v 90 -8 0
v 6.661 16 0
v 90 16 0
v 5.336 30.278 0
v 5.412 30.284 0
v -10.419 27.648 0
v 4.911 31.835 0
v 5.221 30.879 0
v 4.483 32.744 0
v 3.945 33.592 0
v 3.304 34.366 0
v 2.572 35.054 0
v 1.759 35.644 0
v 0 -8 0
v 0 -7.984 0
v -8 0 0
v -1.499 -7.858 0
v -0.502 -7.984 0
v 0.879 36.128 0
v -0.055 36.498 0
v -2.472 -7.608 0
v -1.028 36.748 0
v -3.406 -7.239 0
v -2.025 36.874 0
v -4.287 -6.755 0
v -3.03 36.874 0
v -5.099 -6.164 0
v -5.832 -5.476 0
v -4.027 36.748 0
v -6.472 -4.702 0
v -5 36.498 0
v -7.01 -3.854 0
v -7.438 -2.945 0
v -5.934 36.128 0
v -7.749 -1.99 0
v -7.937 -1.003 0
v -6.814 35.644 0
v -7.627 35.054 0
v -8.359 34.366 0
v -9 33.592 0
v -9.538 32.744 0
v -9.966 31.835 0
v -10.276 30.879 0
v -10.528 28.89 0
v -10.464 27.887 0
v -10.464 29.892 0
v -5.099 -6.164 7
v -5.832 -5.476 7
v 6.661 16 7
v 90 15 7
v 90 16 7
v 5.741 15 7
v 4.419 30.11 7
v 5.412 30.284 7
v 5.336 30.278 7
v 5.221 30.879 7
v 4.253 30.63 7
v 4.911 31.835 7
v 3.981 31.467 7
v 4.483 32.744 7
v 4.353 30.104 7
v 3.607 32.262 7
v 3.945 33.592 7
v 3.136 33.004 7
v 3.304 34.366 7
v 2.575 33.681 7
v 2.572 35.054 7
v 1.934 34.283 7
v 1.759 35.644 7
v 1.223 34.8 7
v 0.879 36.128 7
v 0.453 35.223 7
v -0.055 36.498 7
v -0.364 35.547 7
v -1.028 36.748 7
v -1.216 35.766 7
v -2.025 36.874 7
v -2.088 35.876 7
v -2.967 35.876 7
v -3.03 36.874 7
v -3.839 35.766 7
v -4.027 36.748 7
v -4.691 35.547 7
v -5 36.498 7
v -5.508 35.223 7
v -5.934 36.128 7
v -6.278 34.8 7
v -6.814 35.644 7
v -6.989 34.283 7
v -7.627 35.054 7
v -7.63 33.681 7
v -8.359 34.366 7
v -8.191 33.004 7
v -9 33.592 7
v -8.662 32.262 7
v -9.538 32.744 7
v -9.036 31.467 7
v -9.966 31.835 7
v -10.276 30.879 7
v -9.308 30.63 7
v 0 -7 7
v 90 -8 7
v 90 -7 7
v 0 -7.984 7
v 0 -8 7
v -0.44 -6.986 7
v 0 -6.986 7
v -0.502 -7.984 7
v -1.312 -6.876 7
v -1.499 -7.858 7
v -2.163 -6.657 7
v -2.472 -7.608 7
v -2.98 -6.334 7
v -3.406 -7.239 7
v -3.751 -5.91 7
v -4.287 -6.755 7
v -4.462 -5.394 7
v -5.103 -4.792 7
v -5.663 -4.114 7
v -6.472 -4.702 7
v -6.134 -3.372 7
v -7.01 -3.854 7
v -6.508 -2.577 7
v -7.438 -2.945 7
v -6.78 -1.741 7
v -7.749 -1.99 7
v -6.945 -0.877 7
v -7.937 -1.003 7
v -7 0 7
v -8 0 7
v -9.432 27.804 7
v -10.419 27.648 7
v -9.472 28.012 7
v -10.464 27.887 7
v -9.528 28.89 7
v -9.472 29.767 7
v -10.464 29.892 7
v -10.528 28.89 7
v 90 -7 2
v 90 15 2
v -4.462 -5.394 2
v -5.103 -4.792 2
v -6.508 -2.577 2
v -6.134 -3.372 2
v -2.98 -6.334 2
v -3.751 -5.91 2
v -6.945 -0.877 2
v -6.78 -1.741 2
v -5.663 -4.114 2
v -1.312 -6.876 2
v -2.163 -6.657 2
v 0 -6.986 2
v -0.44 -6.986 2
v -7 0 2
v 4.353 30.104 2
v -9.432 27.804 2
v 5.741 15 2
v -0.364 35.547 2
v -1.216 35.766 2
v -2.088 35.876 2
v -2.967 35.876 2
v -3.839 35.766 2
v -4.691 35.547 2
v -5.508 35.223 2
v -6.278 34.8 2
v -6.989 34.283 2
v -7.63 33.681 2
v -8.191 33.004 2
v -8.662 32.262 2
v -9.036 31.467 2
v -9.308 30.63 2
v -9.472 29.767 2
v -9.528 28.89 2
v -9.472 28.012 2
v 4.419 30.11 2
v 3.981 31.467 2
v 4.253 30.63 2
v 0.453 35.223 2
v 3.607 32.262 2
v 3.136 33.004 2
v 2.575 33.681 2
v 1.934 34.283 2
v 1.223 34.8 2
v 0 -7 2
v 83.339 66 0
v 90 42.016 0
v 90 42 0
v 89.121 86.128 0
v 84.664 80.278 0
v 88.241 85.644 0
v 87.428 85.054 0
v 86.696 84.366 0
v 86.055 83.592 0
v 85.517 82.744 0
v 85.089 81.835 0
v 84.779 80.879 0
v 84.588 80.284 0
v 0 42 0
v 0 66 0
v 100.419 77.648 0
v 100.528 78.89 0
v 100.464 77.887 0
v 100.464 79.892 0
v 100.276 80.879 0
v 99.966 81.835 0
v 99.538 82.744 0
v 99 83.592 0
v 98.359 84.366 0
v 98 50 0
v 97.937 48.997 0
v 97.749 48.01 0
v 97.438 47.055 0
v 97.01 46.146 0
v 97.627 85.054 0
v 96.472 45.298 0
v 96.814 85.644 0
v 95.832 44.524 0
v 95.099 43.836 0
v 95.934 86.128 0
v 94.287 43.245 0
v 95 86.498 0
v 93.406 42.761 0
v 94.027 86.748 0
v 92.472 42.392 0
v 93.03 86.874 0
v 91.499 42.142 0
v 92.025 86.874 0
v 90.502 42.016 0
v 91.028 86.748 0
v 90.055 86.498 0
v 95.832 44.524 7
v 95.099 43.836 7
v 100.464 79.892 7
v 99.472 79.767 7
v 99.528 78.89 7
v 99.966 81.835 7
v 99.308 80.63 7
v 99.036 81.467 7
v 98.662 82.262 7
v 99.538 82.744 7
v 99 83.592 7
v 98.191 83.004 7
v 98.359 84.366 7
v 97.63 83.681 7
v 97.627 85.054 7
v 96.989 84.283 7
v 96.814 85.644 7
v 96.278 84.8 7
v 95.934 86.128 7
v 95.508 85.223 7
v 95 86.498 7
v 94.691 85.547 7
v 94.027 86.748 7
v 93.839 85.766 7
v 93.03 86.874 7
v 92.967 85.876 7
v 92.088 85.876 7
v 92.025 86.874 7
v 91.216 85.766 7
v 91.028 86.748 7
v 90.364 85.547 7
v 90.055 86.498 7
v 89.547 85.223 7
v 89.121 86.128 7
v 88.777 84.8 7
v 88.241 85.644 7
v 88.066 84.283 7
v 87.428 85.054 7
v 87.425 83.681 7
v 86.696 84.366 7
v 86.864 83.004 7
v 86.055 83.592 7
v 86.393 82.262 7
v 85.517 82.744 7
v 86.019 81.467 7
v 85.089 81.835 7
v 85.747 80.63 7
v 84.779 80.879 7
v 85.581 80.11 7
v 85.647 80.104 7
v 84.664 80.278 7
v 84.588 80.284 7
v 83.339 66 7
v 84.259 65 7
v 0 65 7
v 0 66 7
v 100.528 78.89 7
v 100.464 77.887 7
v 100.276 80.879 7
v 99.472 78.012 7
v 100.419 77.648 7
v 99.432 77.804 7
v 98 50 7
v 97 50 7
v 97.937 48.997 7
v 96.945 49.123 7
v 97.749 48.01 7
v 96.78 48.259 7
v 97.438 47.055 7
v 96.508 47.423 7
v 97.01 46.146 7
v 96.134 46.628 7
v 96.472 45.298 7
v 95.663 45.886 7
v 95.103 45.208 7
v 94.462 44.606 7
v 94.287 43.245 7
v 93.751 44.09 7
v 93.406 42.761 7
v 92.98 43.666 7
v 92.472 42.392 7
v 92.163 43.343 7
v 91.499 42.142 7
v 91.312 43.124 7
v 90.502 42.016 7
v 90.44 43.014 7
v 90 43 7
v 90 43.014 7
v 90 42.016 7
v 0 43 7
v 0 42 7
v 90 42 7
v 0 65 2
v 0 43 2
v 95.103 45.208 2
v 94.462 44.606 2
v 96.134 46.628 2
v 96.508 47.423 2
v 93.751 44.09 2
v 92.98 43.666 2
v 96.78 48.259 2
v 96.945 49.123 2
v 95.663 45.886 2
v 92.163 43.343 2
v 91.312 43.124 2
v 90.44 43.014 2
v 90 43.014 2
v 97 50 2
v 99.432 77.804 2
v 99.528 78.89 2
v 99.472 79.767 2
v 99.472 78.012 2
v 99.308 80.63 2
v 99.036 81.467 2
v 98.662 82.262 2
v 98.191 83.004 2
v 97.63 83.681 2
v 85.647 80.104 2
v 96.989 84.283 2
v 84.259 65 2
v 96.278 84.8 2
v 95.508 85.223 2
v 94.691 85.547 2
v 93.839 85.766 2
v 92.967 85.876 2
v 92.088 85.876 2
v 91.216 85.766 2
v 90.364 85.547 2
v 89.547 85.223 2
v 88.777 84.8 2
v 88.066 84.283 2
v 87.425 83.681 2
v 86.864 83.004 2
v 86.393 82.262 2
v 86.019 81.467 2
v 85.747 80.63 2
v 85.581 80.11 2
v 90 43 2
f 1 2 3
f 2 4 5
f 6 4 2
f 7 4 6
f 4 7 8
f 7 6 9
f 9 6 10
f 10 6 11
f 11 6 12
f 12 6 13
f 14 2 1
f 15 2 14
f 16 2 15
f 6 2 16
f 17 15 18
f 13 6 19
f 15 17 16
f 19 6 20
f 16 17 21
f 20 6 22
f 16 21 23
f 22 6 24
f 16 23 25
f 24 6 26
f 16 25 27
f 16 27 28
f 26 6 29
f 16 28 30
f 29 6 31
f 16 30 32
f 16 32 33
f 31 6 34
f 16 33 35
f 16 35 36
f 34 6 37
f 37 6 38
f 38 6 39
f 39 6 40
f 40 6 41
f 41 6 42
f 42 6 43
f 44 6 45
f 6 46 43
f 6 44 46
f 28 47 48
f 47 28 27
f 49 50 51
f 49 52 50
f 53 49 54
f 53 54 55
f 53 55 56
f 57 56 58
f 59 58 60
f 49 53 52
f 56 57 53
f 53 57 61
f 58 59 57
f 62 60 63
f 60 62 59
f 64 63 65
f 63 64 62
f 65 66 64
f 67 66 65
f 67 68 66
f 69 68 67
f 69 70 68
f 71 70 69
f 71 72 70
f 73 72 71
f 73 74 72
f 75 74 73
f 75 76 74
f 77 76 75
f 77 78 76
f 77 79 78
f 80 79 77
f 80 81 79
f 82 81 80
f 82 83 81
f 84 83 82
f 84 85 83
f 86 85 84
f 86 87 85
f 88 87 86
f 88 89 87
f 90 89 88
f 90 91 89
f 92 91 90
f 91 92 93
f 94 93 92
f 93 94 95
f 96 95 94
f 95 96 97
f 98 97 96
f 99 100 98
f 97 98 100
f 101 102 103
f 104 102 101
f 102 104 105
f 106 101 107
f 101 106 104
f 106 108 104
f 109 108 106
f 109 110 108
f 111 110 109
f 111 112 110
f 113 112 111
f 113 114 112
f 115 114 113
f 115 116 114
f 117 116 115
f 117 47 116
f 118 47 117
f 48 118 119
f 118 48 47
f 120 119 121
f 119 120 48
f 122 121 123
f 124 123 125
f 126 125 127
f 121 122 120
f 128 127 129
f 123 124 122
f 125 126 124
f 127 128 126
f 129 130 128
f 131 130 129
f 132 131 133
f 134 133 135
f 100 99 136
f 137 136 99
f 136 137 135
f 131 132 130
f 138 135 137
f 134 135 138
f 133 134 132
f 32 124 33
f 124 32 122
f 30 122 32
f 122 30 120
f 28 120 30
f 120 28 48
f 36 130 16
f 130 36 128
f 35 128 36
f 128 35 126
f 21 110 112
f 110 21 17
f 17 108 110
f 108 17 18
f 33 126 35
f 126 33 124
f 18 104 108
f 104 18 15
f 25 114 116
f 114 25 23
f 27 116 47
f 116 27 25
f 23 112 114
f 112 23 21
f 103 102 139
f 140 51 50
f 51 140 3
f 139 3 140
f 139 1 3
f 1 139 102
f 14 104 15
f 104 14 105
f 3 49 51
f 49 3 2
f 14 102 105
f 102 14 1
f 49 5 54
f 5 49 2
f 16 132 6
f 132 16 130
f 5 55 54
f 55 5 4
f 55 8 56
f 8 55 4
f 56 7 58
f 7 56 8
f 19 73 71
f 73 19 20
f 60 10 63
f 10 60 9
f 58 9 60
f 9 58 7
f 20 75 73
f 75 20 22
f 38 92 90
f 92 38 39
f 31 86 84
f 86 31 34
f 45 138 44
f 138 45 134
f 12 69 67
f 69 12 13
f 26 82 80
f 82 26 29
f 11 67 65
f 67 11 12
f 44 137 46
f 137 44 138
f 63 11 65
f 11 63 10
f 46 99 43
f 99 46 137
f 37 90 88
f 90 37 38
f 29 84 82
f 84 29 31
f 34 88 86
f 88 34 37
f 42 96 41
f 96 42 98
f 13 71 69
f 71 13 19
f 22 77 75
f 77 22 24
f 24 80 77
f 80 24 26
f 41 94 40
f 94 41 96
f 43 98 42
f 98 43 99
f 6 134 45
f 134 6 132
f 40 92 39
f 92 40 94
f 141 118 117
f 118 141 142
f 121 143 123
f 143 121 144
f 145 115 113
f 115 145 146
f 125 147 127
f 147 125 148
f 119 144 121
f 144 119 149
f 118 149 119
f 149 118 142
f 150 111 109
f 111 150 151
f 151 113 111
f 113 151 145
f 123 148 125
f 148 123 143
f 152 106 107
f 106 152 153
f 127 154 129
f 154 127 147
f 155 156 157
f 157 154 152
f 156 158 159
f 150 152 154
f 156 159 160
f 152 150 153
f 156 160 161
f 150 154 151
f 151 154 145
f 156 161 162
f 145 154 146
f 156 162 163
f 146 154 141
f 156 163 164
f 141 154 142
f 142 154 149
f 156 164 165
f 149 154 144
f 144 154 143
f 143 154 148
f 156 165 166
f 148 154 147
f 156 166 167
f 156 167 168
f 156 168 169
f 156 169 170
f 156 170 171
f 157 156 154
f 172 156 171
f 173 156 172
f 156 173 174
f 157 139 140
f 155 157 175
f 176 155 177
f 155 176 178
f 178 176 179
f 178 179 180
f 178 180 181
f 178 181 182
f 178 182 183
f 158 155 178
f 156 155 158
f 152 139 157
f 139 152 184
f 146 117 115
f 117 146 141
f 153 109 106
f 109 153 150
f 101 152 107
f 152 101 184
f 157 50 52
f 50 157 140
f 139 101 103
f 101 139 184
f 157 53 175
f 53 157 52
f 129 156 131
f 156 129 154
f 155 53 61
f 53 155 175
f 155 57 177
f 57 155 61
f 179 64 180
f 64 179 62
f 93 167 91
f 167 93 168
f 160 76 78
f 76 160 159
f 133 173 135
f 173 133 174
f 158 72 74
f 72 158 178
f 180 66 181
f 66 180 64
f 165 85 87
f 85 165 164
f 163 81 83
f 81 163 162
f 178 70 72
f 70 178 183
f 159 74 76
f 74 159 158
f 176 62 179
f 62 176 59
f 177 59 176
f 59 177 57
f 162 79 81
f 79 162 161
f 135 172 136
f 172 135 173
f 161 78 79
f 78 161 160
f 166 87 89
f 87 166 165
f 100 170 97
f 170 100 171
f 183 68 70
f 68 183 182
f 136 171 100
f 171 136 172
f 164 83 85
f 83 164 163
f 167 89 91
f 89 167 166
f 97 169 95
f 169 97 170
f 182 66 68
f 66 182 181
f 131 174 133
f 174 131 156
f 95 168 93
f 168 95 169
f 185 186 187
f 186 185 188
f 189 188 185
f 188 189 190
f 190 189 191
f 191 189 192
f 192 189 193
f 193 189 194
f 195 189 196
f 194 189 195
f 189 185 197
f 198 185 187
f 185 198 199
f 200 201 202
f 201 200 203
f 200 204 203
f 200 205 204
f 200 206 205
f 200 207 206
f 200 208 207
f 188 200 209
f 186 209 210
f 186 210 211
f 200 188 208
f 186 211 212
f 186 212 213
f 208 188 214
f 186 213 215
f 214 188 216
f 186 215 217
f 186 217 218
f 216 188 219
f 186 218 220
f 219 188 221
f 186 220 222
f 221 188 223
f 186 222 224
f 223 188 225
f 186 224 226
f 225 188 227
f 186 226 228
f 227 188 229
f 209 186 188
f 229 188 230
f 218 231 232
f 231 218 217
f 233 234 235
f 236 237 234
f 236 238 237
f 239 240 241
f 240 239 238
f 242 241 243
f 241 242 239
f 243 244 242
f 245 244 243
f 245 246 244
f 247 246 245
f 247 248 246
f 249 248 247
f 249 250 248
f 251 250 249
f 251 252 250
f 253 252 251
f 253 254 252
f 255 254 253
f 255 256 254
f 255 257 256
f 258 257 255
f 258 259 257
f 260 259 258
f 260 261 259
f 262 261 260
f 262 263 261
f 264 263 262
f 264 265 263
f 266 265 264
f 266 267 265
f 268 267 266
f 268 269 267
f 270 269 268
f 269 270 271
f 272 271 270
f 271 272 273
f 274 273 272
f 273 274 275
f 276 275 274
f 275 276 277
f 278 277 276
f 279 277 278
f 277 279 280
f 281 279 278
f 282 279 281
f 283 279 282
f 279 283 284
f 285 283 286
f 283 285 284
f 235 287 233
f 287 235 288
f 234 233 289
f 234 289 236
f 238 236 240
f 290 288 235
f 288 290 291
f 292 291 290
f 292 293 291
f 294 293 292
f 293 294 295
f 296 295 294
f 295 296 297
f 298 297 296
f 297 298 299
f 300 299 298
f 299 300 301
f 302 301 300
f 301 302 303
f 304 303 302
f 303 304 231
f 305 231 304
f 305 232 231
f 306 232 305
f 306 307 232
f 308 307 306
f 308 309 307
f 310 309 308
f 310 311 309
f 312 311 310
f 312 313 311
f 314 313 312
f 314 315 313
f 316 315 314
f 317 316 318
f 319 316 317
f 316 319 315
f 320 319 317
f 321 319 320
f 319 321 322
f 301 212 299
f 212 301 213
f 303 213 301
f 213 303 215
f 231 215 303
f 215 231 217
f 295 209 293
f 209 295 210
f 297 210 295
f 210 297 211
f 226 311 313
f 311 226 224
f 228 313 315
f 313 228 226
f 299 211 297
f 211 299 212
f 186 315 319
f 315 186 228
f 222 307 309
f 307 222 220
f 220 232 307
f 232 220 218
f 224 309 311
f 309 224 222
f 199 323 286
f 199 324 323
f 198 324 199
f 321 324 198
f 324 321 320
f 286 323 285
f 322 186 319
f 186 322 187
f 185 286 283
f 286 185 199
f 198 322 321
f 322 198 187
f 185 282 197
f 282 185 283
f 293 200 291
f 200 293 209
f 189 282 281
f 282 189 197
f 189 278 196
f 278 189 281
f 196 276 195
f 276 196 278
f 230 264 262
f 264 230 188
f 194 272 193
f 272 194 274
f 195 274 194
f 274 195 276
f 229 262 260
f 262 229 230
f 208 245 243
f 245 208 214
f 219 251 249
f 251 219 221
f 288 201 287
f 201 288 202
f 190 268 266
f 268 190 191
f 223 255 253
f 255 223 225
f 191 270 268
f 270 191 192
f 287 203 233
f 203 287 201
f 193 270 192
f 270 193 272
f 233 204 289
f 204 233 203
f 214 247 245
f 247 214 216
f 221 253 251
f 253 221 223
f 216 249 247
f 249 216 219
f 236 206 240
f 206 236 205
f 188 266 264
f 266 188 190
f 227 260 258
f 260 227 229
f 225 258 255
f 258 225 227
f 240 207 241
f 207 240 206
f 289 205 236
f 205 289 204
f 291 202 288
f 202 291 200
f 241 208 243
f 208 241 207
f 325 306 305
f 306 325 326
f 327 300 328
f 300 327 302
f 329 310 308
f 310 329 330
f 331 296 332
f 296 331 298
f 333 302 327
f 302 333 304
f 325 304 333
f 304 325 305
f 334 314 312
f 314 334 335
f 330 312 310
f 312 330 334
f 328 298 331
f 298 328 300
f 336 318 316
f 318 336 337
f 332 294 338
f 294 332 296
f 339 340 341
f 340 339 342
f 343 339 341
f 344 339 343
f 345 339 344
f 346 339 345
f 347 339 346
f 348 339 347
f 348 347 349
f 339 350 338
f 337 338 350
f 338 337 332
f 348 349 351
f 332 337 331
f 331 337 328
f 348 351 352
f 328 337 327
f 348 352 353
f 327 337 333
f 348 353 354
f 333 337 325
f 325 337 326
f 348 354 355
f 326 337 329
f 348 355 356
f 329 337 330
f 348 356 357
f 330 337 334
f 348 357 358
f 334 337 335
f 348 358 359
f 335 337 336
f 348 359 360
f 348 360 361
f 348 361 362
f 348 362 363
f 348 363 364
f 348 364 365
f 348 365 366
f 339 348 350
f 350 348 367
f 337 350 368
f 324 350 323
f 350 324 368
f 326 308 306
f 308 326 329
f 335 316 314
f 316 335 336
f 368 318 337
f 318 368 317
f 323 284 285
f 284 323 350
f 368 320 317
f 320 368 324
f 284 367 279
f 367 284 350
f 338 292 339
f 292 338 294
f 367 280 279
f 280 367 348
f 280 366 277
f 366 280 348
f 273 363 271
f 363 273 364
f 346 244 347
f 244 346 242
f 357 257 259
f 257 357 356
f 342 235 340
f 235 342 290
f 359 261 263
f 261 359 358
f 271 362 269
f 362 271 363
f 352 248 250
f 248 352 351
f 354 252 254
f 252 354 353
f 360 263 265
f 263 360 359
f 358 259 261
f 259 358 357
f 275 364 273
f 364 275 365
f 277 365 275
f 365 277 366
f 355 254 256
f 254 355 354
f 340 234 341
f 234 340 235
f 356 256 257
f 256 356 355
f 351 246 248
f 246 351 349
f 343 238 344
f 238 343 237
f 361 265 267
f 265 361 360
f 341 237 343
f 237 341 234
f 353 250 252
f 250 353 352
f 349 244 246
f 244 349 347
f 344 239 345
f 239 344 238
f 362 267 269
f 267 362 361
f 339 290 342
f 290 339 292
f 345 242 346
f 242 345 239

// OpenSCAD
/*----------------------------------------------------------------------------*/
/*-------                         INFORMATIONS                        --------*/
/*----------------------------------------------------------------------------*/
/*----------------------------------------------------------------------------*/

// CUSTOMIZABLE WINDOW SILL END CAPS (parametric left and right side)
// by Maxim Agapov, August 2018

/*----------------------------------------------------------------------------*/
/*-------                           SETTINGS                          --------*/
/*----------------------------------------------------------------------------*/
a = 24; // размер широкой части // wide part size
b = 16; // размер узкой части // narrow part size
y = 5; //угол наклона 0 или 5 градусов // angle of inclination (0 or 5 degrees)
L1 = 90; // длина широкой части // length of wide part
L2 = 45; // длина узкой части // length of the narrow part
h = 7; // высота бортика // height of the rim
q = "Both"; // Left, Right, if any other value - both left and right

/*----------------------------------------------------------------------------*/
/*-------                             CODE                            --------*/
/*----------------------------------------------------------------------------*/

/*____________________________________________________________________________*/
/* [HIDDEN] */
c = b/2; //радиус скругления //
module Telo(a,b,y,c,L1,L2){
union(){
cylinder(h,c,c, $fn=50);
translate ([0,-c,0]) cube([L1,a,h]);
translate ([-c,0,0]) rotate (y,0,0) cube ([b,L2-c-b/2,h]);
translate ([(L2-b)*cos(90+y),(L2-b)*sin(90-y),0]) cylinder(h,b/2,b/2, $fn=50);
}
}

module Itog(){
difference(){
    Telo(a,b,y,c,L1,L2);
    translate ([0,0,2])
    Telo(a-2,b-2,y,c-1,L1*2,L2-2);
       }
}
if (q == "Right") Itog();
else {
if (q == "Left") mirror([1,0,0]) Itog();
else {
Itog();
mirror([1,0,0])
translate ([-L1,L2+5,0]) Itog();
}
}
